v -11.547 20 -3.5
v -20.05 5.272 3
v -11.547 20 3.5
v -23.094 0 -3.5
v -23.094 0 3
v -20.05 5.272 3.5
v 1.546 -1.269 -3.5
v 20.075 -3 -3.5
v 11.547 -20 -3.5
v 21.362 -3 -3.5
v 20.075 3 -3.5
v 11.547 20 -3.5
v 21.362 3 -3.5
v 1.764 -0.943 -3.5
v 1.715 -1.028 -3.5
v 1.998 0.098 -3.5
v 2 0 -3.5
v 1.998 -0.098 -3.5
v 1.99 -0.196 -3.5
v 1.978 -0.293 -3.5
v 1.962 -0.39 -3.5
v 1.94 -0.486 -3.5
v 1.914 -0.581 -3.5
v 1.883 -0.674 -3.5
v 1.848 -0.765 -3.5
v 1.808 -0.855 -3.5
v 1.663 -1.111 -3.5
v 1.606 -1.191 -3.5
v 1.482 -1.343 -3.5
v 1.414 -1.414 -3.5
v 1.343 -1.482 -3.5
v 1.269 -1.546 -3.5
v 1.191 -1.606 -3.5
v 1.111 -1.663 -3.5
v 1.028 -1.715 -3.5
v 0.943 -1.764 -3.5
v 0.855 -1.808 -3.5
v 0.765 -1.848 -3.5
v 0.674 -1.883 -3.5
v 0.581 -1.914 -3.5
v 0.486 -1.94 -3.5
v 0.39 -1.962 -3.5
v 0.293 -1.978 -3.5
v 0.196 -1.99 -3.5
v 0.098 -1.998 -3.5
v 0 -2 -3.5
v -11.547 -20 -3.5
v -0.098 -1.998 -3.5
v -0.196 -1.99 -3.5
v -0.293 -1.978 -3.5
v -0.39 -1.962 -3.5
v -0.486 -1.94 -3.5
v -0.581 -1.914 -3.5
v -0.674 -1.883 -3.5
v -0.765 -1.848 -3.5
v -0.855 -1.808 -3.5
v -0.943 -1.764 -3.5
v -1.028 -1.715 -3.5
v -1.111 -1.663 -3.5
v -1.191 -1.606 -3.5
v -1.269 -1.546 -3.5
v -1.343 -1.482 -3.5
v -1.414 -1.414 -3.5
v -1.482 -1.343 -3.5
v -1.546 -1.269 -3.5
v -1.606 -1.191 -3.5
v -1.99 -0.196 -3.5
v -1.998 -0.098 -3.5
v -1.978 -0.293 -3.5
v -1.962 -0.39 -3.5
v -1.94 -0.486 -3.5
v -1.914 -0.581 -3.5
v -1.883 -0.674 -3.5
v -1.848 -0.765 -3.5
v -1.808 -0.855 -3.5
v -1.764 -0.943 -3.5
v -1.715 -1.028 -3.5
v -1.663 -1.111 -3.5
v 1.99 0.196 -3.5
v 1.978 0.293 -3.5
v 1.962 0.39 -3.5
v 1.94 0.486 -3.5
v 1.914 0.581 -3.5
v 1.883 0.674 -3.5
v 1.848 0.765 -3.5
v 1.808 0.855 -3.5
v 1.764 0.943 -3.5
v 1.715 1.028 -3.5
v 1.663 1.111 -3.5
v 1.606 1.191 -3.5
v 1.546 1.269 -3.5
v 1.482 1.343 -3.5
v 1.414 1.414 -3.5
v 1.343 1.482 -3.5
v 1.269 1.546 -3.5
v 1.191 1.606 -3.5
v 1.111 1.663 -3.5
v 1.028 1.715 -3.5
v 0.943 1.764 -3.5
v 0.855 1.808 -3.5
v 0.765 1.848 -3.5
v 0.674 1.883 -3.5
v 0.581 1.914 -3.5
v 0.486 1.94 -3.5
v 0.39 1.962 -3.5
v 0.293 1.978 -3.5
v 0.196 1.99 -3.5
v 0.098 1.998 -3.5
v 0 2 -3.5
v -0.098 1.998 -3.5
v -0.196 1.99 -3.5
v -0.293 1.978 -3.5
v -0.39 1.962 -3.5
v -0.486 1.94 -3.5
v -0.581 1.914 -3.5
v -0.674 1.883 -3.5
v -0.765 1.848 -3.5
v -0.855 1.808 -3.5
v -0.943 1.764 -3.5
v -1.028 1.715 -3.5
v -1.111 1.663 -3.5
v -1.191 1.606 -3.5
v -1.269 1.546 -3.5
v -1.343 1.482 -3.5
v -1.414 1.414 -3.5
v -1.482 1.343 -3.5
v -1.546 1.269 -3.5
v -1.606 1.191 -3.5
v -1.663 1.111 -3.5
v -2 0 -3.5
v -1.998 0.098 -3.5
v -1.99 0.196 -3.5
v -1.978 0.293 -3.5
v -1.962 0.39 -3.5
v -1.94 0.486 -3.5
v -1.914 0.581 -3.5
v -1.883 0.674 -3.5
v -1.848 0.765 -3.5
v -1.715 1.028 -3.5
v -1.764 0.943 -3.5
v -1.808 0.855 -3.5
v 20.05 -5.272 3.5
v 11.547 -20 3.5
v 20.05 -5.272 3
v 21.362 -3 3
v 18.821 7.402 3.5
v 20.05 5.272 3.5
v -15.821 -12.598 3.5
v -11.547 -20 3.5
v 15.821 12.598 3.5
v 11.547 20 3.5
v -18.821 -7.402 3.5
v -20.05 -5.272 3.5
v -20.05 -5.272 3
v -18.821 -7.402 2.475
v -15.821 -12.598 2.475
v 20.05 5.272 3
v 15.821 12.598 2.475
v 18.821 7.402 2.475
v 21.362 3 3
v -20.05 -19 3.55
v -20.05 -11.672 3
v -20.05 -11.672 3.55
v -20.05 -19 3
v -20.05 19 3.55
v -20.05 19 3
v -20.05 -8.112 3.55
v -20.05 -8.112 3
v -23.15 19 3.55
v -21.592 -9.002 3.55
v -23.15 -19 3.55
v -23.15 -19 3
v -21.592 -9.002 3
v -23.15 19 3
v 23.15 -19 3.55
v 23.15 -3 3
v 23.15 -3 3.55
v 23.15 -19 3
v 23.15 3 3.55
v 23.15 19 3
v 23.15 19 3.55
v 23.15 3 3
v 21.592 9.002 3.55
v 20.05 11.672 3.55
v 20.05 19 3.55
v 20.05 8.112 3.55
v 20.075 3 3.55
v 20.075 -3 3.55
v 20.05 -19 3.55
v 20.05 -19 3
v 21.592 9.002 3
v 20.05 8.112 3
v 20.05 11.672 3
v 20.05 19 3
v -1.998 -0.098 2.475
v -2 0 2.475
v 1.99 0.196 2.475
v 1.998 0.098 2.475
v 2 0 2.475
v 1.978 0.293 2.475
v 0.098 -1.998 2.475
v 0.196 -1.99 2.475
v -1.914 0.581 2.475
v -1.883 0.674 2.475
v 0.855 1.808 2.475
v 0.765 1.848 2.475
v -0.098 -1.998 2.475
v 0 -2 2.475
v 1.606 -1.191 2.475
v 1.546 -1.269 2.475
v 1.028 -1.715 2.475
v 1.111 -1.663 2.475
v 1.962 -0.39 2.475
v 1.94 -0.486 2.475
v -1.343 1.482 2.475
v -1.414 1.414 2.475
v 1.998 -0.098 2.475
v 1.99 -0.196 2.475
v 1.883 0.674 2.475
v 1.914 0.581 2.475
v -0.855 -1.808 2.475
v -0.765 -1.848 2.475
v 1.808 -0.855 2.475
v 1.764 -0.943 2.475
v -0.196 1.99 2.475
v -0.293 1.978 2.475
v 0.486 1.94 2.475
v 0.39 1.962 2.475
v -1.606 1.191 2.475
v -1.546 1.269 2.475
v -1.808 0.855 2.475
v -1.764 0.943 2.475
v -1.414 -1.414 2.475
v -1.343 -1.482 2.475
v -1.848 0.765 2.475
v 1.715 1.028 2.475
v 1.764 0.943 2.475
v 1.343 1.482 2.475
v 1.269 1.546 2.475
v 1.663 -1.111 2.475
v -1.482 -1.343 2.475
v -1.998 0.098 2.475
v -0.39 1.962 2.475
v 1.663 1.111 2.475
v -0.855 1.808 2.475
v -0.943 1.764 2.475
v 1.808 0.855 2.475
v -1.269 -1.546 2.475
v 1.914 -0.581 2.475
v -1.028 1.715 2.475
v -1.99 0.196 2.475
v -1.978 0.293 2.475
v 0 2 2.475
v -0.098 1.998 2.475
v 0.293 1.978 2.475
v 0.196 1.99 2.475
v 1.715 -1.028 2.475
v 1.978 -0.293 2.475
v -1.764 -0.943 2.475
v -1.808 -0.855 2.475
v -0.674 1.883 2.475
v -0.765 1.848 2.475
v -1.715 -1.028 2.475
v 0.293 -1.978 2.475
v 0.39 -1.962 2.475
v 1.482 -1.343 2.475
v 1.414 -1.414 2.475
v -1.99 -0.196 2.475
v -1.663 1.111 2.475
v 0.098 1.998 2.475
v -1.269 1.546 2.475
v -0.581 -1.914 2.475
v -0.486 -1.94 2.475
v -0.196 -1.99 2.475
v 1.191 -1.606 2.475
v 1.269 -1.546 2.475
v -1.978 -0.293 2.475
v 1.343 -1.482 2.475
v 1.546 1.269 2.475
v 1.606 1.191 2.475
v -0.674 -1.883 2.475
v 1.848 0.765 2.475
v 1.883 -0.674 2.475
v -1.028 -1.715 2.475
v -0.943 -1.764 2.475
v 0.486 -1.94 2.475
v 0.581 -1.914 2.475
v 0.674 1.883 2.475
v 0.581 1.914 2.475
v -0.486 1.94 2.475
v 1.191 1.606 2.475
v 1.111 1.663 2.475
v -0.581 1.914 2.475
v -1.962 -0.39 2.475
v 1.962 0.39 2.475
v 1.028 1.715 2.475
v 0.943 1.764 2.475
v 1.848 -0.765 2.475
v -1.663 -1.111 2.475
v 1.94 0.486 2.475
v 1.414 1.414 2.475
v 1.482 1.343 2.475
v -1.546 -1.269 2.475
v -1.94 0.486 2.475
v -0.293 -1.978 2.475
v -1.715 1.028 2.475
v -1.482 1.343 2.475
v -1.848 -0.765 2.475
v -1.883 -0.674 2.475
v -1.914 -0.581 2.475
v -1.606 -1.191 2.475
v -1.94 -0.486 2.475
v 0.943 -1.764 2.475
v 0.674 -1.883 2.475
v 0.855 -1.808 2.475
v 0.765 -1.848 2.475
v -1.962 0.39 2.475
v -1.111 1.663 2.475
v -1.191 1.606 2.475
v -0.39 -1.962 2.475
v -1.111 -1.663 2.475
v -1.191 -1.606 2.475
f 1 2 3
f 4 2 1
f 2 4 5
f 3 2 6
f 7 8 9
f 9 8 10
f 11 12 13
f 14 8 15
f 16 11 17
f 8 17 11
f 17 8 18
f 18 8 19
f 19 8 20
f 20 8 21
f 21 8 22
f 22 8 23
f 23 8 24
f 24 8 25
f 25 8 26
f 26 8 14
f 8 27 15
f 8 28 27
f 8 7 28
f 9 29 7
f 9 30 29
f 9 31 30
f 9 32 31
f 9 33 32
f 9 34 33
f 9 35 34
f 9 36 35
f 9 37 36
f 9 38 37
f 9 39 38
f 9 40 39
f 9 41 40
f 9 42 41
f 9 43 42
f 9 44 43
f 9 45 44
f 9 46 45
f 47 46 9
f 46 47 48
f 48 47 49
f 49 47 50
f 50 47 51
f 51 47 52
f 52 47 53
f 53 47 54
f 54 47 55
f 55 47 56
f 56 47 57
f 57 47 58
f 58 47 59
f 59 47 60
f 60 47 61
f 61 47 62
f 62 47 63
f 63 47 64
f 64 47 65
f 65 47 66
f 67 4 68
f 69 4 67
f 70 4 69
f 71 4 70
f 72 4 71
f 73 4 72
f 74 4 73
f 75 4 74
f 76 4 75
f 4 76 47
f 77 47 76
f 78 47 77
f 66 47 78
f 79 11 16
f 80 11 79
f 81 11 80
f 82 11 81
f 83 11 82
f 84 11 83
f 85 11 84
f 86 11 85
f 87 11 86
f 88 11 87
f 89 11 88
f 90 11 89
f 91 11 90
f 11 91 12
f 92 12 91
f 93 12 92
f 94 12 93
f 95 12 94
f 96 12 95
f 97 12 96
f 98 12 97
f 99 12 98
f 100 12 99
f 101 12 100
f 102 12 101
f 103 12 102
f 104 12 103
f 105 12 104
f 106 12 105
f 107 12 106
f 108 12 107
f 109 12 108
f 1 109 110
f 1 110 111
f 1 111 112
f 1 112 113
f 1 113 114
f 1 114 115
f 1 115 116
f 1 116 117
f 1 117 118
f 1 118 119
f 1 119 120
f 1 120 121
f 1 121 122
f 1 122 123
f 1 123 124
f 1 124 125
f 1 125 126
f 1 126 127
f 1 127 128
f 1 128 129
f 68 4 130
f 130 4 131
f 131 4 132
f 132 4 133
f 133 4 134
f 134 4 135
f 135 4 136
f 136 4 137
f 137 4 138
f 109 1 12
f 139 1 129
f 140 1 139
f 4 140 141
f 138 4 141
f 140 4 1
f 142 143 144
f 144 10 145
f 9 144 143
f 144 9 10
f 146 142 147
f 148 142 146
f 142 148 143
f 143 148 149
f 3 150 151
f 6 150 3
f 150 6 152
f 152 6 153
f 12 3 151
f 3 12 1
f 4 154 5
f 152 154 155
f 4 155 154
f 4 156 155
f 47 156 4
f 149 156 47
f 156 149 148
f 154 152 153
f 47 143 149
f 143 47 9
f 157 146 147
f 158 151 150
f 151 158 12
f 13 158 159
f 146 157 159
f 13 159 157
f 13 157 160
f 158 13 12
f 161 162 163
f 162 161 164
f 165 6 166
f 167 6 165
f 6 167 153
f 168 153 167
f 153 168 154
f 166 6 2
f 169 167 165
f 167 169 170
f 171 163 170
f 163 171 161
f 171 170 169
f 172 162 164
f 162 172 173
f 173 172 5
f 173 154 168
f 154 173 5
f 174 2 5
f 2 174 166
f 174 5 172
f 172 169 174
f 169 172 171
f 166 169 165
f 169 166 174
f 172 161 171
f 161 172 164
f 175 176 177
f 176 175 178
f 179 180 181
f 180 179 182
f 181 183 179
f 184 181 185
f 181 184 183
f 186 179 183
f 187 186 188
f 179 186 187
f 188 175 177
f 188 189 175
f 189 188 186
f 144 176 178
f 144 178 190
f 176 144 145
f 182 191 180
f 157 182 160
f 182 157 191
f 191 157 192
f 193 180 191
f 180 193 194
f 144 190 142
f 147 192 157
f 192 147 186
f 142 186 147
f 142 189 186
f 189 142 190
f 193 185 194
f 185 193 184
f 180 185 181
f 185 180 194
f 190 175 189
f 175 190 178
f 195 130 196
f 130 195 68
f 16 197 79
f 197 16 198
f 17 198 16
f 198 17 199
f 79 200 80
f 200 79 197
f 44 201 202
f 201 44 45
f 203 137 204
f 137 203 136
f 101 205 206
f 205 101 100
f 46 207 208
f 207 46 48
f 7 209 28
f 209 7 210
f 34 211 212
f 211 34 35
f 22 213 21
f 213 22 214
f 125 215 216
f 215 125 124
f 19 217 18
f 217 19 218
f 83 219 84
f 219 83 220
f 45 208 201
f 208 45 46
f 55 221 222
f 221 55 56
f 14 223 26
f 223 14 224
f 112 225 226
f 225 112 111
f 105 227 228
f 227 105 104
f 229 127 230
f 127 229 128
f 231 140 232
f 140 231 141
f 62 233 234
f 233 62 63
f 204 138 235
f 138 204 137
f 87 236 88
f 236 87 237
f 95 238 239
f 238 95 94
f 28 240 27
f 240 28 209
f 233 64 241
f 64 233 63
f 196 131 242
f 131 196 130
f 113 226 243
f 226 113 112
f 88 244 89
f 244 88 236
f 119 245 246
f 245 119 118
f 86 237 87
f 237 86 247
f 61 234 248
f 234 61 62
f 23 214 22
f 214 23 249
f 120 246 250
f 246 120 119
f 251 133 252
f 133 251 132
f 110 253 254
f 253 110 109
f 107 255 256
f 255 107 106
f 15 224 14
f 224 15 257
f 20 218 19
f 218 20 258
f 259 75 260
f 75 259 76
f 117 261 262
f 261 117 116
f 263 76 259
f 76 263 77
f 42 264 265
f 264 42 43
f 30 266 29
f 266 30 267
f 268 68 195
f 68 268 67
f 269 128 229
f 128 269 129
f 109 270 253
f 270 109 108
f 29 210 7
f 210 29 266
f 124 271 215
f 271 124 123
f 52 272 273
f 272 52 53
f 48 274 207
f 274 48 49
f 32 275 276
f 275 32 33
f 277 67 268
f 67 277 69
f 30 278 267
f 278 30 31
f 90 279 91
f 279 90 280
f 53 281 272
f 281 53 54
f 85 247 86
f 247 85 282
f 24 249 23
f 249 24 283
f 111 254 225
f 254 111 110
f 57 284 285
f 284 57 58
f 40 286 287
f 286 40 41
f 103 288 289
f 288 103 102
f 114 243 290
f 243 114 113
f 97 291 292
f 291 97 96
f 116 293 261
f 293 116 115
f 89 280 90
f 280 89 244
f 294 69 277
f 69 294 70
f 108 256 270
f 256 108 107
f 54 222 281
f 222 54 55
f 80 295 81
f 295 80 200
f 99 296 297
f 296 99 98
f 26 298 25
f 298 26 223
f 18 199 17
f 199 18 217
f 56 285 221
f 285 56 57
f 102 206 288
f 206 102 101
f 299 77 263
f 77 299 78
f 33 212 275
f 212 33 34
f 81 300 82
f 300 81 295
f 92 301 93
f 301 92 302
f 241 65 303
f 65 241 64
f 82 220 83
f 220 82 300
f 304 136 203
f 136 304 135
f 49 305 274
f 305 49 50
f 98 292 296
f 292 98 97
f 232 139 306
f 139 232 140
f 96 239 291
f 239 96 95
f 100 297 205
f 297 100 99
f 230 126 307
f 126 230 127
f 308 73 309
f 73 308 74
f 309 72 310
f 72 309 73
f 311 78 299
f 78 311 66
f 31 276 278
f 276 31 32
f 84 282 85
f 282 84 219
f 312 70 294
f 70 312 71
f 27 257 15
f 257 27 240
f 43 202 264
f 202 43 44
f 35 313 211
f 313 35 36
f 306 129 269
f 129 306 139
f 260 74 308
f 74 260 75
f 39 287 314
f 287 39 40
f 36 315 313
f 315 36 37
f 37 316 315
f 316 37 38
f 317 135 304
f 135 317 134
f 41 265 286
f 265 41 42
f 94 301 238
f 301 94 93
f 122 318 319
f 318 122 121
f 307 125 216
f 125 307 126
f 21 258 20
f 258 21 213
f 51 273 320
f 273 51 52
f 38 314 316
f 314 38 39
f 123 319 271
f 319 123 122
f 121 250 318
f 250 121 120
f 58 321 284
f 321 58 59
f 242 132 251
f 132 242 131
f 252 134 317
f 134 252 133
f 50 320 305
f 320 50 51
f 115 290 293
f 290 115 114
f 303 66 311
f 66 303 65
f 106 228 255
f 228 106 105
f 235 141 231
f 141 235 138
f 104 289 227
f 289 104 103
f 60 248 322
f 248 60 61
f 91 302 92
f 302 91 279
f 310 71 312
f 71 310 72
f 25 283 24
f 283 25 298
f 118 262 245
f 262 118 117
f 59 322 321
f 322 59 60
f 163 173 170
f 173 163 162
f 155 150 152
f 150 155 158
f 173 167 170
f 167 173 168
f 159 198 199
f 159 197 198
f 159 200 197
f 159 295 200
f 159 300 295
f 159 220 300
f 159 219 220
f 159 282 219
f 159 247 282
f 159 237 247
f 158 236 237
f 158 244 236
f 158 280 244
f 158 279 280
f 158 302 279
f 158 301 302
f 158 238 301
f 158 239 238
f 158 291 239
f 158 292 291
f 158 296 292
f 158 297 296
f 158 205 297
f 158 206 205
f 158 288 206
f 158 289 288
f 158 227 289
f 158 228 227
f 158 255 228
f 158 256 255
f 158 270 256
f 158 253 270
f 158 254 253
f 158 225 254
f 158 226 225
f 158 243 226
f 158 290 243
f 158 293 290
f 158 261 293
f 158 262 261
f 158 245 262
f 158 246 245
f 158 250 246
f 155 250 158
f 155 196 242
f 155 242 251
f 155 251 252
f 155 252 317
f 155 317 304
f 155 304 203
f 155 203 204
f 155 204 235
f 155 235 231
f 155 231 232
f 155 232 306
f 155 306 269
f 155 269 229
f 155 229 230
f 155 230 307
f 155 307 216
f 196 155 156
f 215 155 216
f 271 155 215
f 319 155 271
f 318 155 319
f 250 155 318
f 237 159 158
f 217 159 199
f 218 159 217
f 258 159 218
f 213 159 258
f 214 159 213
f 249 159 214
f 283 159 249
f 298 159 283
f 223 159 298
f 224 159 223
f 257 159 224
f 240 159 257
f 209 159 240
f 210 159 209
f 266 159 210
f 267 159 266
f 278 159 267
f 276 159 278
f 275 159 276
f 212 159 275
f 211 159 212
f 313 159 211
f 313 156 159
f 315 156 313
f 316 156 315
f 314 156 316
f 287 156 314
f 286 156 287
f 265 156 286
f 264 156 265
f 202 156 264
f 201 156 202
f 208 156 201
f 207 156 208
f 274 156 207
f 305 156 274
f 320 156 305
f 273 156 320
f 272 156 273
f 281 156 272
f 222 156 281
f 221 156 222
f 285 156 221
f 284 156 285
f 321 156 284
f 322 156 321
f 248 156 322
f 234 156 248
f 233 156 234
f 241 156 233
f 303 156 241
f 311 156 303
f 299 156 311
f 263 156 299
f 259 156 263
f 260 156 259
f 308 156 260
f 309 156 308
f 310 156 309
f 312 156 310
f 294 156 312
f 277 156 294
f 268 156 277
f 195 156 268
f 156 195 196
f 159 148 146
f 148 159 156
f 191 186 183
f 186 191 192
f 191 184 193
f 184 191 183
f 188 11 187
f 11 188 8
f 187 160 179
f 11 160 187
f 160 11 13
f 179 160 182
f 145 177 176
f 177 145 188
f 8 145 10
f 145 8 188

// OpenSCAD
// Hex prismatic spacer/fixture block with:
// - flat-to-flat hex body (W) and controlled overall length (L) via clipping
// - single small circular through-hole near center
// - diagonal recessed band/groove on the top face
// - slight end steps/chamfers (top face) near both ends
// - small notch-like relief on one end
// Bounding box target: 46.2 x 40.0 x 7.0 mm

$fn = 128;

// Target bounding box
L = 46.2;     // X
W = 40.0;     // Y (flat-to-flat)
H = 7.0;      // Z

eps = 0.05;

// Hex geometry (flat-to-flat = W)
apothem = W/2;
R = apothem / cos(30);   // circumradius

// Features
hole_d = 4.0;

groove_w = 6.0;
groove_depth = 1.0;
groove_angle = 30;       // degrees
groove_y_offset = 0.0;

step_len = 3.0;          // length of end step region (each end)
step_inset = 1.0;        // in-plane inset for step
step_drop = 0.5;         // depth of step from top face

notch_w = 6.0;           // along Y
notch_d = 3.0;           // into part from end (along X)
notch_z = H;             // through thickness

// 2D regular hex with flats horizontal (flat-to-flat = W)
module hex2d(ap) {
    RR = ap / cos(30);
    polygon(points=[
        [ RR, 0],
        [ RR/2,  RR*sqrt(3)/2],
        [-RR/2,  RR*sqrt(3)/2],
        [-RR, 0],
        [-RR/2, -RR*sqrt(3)/2],
        [ RR/2, -RR*sqrt(3)/2]
    ]);
}

// Base hex prism, clipped to exact length L in X
module clipped_hex_prism(h) {
    intersection() {
        linear_extrude(height=h, center=true)
            hex2d(apothem);
        cube([L, 2*R + 2*eps, h + 2*eps], center=true);
    }
}

// End top steps (shallow recessed pads) to suggest chamfer/step at ends
module end_top_steps() {
    zc = H/2 - step_drop/2 + eps/2;
    for (sx = [-1, 1]) {
        translate([sx*(L/2 - step_len/2), 0, zc])
            intersection() {
                // limit to end region
                cube([step_len + 2*eps, 2*R + 2*eps, step_drop + eps], center=true);
                // inset hex footprint
                linear_extrude(height=step_drop + eps, center=true)
                    hex2d(max(0.01, apothem - step_inset));
            }
    }
}

// Main solid body (one connected solid)
module body() {
    union() {
        clipped_hex_prism(H);
        end_top_steps();
    }
}

// Through-hole
module through_hole() {
    cylinder(d=hole_d, h=H + 4*eps, center=true);
}

// Diagonal recessed groove on top face
module top_groove() {
    zc = H/2 - groove_depth/2 + eps/2;
    translate([0, groove_y_offset, zc])
        rotate([0, 0, groove_angle])
            cube([L + 4*eps, groove_w, groove_depth + 2*eps], center=true);
}

// Notch-like relief on +X end
module end_notch() {
    x0 = L/2 - notch_d/2 + eps/2; // ensure it bites into the end
    translate([x0, 0, 0])
        cube([notch_d + 2*eps, notch_w, notch_z + 4*eps], center=true);
}

// Final model
difference() {
    body();
    through_hole();
    top_groove();
    end_notch();
}
